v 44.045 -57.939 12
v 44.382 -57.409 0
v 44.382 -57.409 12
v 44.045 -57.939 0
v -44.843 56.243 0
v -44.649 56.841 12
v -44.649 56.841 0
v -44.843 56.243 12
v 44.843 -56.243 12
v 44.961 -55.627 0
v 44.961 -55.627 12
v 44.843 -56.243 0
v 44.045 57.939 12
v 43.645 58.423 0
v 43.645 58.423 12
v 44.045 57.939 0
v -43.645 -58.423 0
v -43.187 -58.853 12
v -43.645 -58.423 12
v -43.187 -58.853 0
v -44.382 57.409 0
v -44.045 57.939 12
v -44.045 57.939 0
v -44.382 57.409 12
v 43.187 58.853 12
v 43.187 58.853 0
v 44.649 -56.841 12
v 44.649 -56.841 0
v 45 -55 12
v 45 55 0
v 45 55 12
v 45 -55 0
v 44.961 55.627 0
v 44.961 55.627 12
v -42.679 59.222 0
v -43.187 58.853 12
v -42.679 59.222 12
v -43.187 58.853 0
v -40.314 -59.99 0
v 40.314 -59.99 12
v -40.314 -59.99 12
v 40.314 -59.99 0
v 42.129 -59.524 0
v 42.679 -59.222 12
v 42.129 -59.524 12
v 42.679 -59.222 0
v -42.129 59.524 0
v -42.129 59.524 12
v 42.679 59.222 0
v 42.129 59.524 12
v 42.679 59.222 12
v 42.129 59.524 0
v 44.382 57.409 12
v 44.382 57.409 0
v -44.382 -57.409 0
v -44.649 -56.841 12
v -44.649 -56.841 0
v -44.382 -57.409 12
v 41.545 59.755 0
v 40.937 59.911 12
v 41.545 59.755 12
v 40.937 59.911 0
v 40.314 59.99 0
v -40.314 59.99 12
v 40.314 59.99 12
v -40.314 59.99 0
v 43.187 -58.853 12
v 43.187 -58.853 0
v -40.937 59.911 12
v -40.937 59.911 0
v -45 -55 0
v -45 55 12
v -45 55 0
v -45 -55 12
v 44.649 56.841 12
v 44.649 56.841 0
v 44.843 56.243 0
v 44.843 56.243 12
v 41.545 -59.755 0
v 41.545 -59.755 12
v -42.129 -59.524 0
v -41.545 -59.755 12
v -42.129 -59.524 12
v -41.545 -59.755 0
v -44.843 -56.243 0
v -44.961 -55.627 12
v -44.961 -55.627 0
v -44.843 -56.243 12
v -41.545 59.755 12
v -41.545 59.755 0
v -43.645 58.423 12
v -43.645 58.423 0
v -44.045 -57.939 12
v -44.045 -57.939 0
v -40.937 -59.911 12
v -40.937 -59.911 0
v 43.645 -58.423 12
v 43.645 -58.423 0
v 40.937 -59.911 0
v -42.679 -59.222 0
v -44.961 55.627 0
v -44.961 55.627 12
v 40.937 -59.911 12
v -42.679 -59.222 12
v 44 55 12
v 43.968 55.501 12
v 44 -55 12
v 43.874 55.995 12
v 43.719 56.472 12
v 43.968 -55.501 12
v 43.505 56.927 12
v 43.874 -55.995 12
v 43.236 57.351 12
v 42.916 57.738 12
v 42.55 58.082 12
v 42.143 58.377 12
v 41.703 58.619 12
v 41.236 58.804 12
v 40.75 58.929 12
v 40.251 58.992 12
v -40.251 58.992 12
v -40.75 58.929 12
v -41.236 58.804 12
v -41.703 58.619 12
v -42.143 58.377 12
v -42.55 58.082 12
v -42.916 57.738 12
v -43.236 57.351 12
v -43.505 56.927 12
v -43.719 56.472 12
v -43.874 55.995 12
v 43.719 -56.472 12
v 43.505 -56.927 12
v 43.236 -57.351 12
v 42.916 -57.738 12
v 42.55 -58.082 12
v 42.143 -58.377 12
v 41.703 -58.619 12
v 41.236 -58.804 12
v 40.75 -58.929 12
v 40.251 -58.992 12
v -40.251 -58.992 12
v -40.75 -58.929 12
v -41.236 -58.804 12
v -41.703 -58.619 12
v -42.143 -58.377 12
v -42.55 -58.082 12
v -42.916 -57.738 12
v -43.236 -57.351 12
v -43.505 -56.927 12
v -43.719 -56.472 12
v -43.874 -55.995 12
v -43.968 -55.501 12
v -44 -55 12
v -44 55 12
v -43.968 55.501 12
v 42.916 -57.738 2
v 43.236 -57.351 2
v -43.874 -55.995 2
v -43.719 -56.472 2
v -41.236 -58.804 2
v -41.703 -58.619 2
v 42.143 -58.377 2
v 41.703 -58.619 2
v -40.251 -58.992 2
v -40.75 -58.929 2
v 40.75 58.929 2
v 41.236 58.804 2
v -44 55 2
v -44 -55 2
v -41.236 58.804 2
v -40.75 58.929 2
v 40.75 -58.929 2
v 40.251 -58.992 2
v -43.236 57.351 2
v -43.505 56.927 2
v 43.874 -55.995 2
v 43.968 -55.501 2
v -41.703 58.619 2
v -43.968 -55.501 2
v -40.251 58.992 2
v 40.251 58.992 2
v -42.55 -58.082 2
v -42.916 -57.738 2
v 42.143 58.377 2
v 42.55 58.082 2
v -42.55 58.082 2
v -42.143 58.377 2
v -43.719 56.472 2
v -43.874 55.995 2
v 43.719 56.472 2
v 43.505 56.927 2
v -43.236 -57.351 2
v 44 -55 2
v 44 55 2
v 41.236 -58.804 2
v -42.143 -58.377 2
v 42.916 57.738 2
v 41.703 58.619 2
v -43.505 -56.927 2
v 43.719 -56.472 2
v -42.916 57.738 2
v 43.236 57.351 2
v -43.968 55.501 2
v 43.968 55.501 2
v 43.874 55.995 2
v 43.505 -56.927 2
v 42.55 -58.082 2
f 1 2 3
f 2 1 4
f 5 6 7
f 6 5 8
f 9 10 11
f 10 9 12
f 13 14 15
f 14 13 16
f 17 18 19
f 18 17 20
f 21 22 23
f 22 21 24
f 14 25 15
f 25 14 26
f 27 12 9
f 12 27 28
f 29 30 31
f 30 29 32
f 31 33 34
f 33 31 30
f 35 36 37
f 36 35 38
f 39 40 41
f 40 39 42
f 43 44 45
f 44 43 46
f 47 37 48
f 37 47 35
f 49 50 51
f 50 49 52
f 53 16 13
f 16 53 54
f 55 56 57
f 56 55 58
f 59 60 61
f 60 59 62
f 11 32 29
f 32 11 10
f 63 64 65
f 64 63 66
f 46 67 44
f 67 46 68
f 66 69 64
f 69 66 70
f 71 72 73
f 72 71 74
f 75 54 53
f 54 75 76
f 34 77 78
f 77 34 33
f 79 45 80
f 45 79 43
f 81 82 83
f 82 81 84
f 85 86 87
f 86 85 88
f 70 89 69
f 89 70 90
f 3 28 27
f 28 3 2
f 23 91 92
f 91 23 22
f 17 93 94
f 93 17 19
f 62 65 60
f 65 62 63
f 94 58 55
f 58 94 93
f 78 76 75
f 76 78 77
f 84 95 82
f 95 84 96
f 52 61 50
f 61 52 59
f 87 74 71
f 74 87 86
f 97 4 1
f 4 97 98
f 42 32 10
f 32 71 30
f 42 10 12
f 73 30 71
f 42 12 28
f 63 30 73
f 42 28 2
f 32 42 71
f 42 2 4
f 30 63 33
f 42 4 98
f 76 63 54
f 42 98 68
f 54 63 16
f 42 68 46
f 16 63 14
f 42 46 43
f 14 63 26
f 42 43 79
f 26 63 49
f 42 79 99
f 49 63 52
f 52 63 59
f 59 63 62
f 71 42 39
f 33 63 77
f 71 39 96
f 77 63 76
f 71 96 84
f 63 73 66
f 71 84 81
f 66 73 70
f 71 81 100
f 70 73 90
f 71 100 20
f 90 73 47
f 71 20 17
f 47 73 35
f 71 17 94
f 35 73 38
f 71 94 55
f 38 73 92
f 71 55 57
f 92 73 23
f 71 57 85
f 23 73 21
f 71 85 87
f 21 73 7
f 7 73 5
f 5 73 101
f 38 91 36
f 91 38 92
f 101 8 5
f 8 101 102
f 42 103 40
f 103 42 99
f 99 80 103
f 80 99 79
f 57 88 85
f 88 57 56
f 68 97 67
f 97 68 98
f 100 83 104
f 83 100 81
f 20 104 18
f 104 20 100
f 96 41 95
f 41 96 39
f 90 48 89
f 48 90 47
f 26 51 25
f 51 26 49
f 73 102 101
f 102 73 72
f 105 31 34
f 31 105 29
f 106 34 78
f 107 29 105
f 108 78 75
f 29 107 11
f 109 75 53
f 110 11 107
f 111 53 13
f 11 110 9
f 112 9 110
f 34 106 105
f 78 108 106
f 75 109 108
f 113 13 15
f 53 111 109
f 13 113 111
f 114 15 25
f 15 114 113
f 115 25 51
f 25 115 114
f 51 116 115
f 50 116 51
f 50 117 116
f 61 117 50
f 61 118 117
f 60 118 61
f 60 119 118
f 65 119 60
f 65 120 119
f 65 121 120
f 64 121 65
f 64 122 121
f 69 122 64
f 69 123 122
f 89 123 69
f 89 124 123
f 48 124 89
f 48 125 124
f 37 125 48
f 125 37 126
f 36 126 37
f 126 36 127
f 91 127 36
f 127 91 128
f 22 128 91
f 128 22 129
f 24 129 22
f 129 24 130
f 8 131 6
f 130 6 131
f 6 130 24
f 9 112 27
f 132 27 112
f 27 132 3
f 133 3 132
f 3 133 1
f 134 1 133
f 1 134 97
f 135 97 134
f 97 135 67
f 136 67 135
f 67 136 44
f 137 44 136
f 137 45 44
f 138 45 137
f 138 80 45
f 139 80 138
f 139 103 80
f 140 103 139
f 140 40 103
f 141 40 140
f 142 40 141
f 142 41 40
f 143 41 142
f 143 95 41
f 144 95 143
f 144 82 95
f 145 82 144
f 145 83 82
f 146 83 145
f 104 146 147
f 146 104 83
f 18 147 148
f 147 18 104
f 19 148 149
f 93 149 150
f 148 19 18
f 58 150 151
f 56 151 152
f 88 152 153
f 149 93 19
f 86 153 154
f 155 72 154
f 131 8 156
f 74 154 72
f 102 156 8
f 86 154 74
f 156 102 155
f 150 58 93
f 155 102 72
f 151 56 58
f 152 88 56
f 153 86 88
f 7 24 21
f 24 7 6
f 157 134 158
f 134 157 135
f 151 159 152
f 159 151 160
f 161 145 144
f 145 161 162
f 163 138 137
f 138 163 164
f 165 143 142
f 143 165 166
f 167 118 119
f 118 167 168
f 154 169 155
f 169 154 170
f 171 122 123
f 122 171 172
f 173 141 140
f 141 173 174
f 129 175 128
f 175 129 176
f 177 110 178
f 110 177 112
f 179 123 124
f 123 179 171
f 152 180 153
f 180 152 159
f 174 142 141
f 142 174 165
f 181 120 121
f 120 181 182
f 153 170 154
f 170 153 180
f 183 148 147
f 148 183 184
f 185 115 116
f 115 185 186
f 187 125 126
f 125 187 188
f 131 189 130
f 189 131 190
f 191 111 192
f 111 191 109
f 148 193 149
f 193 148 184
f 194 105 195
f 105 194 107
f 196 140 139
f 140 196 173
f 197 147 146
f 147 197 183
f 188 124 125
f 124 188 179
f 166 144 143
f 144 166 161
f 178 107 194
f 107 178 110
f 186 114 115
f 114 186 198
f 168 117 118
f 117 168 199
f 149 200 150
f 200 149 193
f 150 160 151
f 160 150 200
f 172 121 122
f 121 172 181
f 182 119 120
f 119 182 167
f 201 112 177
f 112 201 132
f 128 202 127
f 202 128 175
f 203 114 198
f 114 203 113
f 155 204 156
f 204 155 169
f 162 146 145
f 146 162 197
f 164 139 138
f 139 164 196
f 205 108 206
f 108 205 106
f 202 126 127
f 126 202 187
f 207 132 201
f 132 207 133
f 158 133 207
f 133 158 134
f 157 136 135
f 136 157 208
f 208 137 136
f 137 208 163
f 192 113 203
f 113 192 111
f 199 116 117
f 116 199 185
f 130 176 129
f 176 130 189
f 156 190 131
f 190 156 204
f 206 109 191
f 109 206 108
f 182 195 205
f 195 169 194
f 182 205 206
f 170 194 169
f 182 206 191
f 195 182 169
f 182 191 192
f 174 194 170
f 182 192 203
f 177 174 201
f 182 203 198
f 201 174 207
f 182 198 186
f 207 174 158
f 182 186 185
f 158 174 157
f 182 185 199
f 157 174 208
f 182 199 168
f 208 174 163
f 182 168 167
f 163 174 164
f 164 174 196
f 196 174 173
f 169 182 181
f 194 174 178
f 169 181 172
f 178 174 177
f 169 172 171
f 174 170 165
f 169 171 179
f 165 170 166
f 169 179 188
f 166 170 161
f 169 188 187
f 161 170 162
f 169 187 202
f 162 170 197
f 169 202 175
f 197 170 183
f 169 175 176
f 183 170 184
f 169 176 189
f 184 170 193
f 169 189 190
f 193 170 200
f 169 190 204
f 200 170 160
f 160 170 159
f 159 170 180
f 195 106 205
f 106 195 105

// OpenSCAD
$fn = 50;


difference() {
	union() {
		hull() {
			translate(v = [-40.0000000000, 55.0000000000, 0]) {
				cylinder(h = 12, r = 5);
			}
			translate(v = [40.0000000000, 55.0000000000, 0]) {
				cylinder(h = 12, r = 5);
			}
			translate(v = [-40.0000000000, -55.0000000000, 0]) {
				cylinder(h = 12, r = 5);
			}
			translate(v = [40.0000000000, -55.0000000000, 0]) {
				cylinder(h = 12, r = 5);
			}
		}
	}
	union() {
		translate(v = [0, 0, 2]) {
			hull() {
				translate(v = [-40.0000000000, 55.0000000000, 0]) {
					cylinder(h = 10, r = 4);
				}
				translate(v = [40.0000000000, 55.0000000000, 0]) {
					cylinder(h = 10, r = 4);
				}
				translate(v = [-40.0000000000, -55.0000000000, 0]) {
					cylinder(h = 10, r = 4);
				}
				translate(v = [40.0000000000, -55.0000000000, 0]) {
					cylinder(h = 10, r = 4);
				}
			}
		}
	}
}
